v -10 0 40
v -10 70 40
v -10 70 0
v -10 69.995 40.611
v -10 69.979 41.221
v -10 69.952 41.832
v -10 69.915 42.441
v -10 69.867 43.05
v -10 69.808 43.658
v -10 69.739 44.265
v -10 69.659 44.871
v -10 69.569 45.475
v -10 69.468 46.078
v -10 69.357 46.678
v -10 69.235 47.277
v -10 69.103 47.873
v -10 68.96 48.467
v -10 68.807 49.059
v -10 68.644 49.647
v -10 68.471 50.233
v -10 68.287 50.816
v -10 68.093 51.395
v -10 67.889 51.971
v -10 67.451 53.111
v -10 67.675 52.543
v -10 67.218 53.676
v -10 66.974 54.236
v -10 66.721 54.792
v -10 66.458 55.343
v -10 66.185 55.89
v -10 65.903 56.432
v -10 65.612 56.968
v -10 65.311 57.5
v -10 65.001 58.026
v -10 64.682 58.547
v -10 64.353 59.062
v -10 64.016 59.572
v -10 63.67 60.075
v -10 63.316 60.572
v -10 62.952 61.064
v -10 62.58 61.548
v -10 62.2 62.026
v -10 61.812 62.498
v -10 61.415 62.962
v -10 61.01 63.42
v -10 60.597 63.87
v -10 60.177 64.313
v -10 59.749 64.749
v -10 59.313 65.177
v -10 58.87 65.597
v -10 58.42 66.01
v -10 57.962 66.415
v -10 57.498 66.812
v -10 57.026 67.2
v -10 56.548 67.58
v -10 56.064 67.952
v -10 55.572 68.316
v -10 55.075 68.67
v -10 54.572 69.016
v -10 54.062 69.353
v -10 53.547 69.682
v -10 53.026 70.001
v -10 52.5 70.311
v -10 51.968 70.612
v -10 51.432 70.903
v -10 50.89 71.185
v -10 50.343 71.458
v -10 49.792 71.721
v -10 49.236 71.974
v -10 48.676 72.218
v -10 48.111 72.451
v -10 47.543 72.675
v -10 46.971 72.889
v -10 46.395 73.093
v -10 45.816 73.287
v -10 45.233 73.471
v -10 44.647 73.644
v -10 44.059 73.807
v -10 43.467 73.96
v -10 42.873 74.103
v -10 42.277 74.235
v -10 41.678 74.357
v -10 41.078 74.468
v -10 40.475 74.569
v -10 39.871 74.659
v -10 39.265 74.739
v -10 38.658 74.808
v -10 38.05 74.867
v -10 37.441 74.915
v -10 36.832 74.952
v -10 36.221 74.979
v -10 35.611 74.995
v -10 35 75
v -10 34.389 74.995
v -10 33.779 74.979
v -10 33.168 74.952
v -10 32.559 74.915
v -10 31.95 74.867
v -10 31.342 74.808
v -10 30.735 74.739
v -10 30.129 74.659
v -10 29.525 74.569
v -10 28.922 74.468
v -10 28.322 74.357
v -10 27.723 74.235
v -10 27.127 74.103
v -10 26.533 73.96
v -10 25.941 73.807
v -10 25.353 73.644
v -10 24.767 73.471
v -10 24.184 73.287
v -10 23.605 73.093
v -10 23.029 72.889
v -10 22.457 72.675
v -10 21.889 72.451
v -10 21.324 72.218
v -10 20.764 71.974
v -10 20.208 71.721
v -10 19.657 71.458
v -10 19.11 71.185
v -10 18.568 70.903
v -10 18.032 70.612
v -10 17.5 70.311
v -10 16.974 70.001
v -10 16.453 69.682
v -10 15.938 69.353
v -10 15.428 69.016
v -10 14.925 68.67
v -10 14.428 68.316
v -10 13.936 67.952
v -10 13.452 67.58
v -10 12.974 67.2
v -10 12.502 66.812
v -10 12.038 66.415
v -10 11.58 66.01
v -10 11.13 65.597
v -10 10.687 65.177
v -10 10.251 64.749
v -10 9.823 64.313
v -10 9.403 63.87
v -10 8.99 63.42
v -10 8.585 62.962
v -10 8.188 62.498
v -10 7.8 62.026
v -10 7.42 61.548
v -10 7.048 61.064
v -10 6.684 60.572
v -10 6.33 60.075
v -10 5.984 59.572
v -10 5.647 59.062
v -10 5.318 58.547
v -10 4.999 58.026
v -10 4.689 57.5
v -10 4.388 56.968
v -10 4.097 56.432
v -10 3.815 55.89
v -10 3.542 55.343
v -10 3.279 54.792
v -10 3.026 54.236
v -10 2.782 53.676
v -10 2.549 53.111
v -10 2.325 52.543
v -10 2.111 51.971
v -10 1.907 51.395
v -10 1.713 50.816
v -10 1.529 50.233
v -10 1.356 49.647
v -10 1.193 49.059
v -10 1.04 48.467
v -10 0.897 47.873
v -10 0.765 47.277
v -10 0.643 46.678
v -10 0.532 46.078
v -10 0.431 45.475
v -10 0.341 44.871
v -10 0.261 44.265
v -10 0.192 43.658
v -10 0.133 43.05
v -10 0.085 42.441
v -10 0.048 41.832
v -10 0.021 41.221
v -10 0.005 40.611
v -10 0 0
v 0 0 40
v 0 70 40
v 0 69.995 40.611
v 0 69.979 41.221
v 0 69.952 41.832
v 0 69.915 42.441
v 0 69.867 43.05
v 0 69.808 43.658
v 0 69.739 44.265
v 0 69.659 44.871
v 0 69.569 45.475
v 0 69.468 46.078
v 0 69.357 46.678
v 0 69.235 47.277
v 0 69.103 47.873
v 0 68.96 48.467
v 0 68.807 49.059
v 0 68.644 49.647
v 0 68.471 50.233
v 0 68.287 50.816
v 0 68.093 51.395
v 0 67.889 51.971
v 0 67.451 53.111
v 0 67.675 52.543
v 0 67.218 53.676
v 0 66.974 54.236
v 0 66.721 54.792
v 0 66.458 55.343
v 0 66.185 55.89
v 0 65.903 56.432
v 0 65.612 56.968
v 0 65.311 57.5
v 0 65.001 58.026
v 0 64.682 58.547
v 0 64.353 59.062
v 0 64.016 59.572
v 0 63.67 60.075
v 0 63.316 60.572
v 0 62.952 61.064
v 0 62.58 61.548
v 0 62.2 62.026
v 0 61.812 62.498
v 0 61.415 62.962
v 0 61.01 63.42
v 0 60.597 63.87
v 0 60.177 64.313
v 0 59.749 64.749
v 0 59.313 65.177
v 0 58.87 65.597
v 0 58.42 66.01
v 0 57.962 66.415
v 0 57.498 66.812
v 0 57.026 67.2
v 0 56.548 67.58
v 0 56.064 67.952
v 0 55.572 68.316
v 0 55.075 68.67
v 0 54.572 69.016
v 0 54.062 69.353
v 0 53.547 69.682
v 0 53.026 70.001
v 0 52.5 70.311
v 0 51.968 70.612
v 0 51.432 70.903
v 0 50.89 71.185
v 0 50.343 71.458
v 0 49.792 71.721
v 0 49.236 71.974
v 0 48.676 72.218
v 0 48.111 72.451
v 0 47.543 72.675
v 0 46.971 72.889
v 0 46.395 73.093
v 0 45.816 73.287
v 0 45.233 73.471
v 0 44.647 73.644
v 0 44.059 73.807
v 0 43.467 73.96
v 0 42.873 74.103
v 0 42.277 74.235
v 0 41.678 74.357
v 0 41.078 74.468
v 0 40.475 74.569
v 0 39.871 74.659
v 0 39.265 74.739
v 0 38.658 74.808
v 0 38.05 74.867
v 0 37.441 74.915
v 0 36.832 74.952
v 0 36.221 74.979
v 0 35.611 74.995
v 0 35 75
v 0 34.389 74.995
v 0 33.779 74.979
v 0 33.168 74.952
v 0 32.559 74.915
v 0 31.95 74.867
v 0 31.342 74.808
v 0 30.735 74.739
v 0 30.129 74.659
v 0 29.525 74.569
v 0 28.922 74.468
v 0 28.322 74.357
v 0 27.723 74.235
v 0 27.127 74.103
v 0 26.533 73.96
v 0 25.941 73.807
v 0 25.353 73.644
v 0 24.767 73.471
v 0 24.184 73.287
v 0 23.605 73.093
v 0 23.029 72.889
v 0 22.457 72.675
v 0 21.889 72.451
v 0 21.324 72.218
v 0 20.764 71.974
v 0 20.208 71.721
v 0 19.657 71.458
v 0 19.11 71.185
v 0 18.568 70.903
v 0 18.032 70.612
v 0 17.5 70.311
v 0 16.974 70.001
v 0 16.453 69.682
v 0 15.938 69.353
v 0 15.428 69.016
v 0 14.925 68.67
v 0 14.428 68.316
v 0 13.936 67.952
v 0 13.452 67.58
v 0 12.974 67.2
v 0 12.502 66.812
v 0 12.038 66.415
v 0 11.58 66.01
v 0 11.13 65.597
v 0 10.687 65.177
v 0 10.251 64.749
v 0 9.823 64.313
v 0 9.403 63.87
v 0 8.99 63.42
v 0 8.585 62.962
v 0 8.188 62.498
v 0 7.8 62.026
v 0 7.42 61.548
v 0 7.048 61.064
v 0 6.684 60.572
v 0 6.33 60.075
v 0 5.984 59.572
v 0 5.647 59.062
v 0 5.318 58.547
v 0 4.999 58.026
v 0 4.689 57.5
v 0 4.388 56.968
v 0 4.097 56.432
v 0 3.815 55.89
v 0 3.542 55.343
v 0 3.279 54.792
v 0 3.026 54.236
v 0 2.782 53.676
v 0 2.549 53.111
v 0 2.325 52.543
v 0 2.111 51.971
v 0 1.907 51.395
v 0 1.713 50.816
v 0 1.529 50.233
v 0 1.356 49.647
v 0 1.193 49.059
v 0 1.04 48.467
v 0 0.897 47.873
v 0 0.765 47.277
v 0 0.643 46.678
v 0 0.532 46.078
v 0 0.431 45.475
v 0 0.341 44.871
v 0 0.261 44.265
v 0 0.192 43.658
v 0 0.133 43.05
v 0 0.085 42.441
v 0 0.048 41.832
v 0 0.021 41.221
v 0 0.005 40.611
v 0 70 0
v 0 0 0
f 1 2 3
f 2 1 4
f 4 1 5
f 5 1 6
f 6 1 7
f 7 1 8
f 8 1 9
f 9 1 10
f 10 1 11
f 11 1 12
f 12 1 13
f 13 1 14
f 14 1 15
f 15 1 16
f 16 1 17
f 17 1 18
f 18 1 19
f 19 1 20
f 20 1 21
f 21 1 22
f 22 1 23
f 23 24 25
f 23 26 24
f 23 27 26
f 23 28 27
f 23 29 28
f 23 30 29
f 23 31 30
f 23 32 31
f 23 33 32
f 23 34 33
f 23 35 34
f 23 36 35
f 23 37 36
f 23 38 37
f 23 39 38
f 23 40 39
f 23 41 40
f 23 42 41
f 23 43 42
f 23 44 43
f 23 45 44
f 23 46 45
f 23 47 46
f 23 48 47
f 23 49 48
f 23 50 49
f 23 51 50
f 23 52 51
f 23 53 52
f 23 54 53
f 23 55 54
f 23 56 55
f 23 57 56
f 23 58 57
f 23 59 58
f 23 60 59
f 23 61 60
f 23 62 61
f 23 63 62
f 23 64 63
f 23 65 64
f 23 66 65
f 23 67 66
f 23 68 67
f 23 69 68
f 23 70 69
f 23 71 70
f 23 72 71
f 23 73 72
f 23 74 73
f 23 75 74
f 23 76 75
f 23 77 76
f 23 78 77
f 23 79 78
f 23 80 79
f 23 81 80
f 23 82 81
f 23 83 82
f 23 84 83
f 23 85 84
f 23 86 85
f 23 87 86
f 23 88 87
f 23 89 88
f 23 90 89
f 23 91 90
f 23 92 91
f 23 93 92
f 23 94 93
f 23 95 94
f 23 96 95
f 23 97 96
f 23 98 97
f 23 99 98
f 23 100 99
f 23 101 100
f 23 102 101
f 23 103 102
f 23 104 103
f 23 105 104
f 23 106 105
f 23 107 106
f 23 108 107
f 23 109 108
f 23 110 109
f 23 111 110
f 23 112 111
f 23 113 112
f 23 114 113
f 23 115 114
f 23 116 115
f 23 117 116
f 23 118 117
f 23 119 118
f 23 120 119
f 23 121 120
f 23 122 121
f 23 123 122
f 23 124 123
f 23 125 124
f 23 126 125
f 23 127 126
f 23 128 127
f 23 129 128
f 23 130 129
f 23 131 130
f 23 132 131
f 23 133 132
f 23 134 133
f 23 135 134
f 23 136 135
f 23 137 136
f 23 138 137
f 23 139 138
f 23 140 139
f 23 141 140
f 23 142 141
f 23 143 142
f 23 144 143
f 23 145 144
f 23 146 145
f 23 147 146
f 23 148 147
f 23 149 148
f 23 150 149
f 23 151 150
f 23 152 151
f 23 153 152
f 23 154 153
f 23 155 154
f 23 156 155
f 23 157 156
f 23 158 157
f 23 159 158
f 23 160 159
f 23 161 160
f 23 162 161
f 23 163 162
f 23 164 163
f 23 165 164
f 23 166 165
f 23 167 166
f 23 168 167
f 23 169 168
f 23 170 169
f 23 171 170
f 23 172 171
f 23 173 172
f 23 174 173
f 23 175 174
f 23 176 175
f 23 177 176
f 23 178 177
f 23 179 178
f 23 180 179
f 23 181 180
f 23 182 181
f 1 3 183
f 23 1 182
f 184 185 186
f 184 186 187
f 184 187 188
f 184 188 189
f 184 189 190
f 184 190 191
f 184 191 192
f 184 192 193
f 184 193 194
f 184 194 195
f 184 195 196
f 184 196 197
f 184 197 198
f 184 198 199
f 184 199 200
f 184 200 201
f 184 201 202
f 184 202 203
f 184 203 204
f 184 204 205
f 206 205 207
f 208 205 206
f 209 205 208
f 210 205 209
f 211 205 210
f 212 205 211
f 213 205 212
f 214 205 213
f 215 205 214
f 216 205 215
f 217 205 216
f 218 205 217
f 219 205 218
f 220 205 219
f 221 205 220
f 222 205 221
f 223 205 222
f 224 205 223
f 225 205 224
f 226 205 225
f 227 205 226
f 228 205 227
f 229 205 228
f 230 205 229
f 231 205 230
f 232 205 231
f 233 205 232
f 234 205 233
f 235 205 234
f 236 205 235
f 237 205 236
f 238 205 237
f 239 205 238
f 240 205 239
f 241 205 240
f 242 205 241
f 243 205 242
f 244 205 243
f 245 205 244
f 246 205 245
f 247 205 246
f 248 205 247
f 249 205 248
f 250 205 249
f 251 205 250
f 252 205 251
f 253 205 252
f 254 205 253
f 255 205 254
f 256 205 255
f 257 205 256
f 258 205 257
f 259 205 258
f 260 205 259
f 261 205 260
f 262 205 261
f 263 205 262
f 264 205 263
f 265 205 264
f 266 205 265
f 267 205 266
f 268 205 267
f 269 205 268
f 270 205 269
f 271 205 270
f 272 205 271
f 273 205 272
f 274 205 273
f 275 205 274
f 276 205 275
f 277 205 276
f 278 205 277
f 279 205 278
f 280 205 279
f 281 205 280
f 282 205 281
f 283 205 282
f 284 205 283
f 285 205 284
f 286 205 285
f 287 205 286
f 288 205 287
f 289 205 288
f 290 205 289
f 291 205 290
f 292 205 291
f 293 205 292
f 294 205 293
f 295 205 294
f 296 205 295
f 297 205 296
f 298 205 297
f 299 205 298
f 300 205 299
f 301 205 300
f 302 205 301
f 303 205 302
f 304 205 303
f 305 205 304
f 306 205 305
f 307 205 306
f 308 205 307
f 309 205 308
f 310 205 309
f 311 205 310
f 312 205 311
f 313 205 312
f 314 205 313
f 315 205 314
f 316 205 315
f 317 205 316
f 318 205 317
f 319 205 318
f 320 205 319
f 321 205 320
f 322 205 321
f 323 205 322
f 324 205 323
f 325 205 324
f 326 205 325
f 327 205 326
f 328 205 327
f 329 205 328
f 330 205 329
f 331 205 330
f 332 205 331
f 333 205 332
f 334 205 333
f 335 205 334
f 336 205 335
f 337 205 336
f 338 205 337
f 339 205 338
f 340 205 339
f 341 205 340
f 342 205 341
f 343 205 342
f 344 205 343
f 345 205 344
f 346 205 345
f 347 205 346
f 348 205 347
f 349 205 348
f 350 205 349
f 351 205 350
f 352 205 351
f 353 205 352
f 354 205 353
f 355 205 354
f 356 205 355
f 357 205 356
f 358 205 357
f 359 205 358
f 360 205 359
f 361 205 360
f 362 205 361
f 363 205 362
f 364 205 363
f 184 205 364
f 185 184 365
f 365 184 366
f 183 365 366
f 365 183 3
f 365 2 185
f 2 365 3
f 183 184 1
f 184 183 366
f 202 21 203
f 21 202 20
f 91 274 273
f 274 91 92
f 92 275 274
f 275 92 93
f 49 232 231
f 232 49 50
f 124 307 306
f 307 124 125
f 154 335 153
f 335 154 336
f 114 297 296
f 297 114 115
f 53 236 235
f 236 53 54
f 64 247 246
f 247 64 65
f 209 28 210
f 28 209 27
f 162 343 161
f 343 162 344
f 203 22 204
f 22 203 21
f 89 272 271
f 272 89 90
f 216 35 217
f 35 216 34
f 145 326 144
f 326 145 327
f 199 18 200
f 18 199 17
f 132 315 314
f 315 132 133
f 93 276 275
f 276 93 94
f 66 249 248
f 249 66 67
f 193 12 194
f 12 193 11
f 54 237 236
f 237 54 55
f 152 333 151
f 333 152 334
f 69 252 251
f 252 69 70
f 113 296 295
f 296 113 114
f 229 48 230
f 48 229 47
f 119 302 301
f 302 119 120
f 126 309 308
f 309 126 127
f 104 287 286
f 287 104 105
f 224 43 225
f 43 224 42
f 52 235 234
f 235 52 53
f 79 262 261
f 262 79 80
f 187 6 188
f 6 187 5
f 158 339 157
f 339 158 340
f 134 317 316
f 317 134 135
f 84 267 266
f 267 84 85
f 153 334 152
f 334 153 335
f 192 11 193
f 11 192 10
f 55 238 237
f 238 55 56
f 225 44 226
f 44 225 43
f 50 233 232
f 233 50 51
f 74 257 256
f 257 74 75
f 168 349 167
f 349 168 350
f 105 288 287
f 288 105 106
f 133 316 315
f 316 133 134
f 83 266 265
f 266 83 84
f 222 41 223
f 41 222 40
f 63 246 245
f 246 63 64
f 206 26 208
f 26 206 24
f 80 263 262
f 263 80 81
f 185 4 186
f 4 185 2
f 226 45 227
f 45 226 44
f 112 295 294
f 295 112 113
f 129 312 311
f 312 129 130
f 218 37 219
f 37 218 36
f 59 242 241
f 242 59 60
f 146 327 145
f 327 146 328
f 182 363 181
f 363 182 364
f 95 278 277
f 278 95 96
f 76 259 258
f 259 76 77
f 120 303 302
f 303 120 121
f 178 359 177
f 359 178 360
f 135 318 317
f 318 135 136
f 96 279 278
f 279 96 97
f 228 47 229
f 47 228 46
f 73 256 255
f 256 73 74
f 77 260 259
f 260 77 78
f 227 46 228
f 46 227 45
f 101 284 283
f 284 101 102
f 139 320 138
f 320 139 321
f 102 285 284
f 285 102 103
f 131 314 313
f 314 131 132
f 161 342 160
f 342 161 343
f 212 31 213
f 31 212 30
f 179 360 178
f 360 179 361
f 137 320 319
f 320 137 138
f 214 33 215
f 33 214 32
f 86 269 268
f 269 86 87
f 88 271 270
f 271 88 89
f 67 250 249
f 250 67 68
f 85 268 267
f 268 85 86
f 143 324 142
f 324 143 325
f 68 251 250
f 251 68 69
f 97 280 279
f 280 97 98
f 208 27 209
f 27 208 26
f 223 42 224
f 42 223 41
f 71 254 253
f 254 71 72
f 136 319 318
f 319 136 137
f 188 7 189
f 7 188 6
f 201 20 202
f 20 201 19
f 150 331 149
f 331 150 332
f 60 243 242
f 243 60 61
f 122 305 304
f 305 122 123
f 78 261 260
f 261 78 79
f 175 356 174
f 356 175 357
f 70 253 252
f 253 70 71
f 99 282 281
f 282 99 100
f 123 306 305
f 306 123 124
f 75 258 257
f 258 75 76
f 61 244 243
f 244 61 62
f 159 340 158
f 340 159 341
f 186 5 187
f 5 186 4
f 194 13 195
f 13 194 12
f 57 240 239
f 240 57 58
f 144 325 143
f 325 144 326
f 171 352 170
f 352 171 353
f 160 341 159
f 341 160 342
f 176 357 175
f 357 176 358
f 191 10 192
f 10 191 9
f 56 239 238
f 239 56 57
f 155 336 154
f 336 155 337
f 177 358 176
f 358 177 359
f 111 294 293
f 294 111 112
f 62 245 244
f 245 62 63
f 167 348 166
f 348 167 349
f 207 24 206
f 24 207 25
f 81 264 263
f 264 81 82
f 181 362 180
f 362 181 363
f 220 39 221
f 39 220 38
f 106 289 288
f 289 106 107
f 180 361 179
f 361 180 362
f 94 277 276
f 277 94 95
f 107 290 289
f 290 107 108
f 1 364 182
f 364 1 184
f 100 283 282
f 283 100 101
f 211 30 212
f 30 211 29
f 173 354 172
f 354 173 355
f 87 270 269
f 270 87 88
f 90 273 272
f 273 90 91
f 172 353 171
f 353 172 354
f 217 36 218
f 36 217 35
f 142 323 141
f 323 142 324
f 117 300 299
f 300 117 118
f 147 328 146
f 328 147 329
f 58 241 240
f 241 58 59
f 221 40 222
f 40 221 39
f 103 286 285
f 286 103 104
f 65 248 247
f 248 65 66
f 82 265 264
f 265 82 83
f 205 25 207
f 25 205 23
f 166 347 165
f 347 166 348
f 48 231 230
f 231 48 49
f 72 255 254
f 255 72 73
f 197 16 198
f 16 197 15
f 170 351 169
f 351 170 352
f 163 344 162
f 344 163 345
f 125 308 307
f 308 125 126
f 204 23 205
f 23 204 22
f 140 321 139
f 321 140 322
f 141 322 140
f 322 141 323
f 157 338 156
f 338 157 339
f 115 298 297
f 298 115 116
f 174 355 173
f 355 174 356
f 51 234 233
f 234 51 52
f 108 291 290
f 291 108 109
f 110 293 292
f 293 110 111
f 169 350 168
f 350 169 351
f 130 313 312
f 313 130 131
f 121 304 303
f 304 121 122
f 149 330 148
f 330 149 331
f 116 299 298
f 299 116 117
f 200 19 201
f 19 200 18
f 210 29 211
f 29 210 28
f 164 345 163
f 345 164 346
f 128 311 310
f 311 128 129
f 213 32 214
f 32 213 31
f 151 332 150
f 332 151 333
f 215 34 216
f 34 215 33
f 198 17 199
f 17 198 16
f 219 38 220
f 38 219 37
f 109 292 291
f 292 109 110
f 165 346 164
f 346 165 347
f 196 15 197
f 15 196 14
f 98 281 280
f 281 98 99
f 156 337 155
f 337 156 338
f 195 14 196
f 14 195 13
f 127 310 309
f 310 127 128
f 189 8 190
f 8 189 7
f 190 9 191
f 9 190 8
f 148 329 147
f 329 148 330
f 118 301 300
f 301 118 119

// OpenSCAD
$fs = 0.1;
$fa = 1;
$epsilon = 0.01;


rotate([0, -90, 0]) {
    cube([40, 70, 10]);

    translate([40, 35, 0])
    cylinder(h=10, r=35);
}
